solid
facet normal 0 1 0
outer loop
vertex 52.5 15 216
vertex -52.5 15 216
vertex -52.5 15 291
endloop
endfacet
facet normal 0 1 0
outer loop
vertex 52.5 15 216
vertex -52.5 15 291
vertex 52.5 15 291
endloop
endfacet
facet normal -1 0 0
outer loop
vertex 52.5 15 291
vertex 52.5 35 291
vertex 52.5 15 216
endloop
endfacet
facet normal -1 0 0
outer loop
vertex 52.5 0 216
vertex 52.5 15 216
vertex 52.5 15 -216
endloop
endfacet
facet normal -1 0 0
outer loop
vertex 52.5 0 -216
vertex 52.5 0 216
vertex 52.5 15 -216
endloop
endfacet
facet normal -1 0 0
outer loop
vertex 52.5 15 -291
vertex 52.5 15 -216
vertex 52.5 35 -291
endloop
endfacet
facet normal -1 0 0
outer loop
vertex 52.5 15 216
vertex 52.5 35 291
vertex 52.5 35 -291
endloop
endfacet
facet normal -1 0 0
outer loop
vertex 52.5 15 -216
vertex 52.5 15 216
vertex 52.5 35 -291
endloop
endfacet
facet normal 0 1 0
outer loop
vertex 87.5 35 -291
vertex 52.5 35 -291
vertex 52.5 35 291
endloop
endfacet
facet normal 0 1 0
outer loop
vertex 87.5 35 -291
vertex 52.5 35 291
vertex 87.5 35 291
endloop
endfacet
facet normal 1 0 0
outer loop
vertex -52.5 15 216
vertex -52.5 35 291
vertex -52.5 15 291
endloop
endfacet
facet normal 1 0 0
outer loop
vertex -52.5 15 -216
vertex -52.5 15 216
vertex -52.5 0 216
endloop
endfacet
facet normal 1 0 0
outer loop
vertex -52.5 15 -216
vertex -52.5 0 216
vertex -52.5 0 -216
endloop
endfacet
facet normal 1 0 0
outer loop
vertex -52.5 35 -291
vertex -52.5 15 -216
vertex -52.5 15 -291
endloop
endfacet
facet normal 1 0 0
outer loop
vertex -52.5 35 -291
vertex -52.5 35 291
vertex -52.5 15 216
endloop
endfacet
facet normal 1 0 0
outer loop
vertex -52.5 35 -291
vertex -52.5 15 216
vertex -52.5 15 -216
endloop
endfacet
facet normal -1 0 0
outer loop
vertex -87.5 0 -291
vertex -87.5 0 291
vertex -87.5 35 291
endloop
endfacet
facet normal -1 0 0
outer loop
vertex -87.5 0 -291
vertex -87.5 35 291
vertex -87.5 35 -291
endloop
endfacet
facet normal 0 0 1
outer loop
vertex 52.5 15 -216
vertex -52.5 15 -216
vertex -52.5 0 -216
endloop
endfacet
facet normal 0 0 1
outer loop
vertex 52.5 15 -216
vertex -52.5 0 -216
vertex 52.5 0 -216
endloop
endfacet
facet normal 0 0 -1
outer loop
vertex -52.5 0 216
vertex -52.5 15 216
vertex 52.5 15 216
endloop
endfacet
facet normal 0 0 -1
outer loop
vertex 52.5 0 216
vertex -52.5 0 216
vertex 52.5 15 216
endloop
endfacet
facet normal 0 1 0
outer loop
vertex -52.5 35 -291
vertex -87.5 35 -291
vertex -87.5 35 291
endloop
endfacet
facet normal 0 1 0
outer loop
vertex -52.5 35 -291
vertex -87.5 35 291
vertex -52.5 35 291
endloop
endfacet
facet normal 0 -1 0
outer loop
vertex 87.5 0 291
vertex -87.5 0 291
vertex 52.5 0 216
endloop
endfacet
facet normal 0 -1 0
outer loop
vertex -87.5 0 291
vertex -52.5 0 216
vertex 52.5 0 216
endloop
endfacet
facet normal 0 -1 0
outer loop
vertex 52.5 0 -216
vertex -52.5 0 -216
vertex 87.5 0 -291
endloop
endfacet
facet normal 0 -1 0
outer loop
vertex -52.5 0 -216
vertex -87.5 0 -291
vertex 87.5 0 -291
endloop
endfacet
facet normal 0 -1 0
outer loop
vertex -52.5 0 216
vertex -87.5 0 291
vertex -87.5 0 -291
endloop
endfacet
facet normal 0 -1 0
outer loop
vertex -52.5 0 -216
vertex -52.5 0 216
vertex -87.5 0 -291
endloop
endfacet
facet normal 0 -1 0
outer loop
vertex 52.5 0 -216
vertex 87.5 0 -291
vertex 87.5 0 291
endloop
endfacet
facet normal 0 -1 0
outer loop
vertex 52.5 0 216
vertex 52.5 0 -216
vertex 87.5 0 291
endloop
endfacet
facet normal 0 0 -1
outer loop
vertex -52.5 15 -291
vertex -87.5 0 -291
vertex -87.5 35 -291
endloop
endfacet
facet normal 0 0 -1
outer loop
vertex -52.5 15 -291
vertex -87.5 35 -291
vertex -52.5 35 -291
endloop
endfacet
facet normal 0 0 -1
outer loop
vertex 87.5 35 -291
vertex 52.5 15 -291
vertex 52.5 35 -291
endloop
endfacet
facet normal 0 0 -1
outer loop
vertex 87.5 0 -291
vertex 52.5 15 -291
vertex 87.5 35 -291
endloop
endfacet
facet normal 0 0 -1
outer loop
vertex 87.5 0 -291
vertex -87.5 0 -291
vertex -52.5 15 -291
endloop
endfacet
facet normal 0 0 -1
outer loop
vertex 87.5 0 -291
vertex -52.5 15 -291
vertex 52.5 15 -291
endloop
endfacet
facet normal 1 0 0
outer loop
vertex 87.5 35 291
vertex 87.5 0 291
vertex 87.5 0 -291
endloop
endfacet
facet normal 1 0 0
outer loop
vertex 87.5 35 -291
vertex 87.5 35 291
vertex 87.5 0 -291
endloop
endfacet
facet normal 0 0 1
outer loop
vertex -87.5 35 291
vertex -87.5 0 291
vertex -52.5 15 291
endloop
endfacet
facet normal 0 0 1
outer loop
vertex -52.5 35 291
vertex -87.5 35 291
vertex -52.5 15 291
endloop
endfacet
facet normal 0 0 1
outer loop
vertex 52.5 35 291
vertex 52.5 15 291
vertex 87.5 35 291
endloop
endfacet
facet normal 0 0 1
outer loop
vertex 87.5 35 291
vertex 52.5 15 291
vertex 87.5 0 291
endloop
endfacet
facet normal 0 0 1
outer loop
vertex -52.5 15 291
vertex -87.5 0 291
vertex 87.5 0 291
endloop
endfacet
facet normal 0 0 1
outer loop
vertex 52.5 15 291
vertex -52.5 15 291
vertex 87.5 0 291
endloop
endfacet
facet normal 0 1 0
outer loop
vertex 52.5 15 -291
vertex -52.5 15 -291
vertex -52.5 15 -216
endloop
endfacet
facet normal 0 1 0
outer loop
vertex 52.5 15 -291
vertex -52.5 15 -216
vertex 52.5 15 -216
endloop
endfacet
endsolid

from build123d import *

# Parameters (mm, degrees)
CROQUIS1_W              = 175
CROQUIS1_H              = 582
SALIENTE_EXTRUIR1_DEPTH = 35
CROQUIS2_W              = 105
CROQUIS2_H              = 582
CORTAR_EXTRUIR1_DEPTH   = 20
CROQUIS3_W              = 105
CROQUIS3_H              = 432
CORTAR_EXTRUIR2_DEPTH   = 305.527913335


with BuildPart() as part:
    # Croquis1 → Saliente-Extruir1 (new body)
    with BuildSketch(Plane(origin=(0, 0, 0), x_dir=(1, 0, 0), z_dir=(0, 1, 0))):
        Rectangle(CROQUIS1_W, CROQUIS1_H)
    extrude(amount=SALIENTE_EXTRUIR1_DEPTH)

    # Croquis2 → Cortar-Extruir1 (cut)
    with BuildSketch(Plane(origin=(0, 35, 0), x_dir=(1, 0, 0), z_dir=(0, 1, 0))):
        Rectangle(CROQUIS2_W, CROQUIS2_H)
    extrude(amount=-CORTAR_EXTRUIR1_DEPTH, mode=Mode.SUBTRACT)

    # Croquis3 → Cortar-Extruir2 (cut, through all)
    with BuildSketch(Plane(origin=(0, 15, 0), x_dir=(1, 0, 0), z_dir=(0, 1, 0))):
        Rectangle(CROQUIS3_W, CROQUIS3_H)
    extrude(amount=-CORTAR_EXTRUIR2_DEPTH, mode=Mode.SUBTRACT)


solid = part.part
